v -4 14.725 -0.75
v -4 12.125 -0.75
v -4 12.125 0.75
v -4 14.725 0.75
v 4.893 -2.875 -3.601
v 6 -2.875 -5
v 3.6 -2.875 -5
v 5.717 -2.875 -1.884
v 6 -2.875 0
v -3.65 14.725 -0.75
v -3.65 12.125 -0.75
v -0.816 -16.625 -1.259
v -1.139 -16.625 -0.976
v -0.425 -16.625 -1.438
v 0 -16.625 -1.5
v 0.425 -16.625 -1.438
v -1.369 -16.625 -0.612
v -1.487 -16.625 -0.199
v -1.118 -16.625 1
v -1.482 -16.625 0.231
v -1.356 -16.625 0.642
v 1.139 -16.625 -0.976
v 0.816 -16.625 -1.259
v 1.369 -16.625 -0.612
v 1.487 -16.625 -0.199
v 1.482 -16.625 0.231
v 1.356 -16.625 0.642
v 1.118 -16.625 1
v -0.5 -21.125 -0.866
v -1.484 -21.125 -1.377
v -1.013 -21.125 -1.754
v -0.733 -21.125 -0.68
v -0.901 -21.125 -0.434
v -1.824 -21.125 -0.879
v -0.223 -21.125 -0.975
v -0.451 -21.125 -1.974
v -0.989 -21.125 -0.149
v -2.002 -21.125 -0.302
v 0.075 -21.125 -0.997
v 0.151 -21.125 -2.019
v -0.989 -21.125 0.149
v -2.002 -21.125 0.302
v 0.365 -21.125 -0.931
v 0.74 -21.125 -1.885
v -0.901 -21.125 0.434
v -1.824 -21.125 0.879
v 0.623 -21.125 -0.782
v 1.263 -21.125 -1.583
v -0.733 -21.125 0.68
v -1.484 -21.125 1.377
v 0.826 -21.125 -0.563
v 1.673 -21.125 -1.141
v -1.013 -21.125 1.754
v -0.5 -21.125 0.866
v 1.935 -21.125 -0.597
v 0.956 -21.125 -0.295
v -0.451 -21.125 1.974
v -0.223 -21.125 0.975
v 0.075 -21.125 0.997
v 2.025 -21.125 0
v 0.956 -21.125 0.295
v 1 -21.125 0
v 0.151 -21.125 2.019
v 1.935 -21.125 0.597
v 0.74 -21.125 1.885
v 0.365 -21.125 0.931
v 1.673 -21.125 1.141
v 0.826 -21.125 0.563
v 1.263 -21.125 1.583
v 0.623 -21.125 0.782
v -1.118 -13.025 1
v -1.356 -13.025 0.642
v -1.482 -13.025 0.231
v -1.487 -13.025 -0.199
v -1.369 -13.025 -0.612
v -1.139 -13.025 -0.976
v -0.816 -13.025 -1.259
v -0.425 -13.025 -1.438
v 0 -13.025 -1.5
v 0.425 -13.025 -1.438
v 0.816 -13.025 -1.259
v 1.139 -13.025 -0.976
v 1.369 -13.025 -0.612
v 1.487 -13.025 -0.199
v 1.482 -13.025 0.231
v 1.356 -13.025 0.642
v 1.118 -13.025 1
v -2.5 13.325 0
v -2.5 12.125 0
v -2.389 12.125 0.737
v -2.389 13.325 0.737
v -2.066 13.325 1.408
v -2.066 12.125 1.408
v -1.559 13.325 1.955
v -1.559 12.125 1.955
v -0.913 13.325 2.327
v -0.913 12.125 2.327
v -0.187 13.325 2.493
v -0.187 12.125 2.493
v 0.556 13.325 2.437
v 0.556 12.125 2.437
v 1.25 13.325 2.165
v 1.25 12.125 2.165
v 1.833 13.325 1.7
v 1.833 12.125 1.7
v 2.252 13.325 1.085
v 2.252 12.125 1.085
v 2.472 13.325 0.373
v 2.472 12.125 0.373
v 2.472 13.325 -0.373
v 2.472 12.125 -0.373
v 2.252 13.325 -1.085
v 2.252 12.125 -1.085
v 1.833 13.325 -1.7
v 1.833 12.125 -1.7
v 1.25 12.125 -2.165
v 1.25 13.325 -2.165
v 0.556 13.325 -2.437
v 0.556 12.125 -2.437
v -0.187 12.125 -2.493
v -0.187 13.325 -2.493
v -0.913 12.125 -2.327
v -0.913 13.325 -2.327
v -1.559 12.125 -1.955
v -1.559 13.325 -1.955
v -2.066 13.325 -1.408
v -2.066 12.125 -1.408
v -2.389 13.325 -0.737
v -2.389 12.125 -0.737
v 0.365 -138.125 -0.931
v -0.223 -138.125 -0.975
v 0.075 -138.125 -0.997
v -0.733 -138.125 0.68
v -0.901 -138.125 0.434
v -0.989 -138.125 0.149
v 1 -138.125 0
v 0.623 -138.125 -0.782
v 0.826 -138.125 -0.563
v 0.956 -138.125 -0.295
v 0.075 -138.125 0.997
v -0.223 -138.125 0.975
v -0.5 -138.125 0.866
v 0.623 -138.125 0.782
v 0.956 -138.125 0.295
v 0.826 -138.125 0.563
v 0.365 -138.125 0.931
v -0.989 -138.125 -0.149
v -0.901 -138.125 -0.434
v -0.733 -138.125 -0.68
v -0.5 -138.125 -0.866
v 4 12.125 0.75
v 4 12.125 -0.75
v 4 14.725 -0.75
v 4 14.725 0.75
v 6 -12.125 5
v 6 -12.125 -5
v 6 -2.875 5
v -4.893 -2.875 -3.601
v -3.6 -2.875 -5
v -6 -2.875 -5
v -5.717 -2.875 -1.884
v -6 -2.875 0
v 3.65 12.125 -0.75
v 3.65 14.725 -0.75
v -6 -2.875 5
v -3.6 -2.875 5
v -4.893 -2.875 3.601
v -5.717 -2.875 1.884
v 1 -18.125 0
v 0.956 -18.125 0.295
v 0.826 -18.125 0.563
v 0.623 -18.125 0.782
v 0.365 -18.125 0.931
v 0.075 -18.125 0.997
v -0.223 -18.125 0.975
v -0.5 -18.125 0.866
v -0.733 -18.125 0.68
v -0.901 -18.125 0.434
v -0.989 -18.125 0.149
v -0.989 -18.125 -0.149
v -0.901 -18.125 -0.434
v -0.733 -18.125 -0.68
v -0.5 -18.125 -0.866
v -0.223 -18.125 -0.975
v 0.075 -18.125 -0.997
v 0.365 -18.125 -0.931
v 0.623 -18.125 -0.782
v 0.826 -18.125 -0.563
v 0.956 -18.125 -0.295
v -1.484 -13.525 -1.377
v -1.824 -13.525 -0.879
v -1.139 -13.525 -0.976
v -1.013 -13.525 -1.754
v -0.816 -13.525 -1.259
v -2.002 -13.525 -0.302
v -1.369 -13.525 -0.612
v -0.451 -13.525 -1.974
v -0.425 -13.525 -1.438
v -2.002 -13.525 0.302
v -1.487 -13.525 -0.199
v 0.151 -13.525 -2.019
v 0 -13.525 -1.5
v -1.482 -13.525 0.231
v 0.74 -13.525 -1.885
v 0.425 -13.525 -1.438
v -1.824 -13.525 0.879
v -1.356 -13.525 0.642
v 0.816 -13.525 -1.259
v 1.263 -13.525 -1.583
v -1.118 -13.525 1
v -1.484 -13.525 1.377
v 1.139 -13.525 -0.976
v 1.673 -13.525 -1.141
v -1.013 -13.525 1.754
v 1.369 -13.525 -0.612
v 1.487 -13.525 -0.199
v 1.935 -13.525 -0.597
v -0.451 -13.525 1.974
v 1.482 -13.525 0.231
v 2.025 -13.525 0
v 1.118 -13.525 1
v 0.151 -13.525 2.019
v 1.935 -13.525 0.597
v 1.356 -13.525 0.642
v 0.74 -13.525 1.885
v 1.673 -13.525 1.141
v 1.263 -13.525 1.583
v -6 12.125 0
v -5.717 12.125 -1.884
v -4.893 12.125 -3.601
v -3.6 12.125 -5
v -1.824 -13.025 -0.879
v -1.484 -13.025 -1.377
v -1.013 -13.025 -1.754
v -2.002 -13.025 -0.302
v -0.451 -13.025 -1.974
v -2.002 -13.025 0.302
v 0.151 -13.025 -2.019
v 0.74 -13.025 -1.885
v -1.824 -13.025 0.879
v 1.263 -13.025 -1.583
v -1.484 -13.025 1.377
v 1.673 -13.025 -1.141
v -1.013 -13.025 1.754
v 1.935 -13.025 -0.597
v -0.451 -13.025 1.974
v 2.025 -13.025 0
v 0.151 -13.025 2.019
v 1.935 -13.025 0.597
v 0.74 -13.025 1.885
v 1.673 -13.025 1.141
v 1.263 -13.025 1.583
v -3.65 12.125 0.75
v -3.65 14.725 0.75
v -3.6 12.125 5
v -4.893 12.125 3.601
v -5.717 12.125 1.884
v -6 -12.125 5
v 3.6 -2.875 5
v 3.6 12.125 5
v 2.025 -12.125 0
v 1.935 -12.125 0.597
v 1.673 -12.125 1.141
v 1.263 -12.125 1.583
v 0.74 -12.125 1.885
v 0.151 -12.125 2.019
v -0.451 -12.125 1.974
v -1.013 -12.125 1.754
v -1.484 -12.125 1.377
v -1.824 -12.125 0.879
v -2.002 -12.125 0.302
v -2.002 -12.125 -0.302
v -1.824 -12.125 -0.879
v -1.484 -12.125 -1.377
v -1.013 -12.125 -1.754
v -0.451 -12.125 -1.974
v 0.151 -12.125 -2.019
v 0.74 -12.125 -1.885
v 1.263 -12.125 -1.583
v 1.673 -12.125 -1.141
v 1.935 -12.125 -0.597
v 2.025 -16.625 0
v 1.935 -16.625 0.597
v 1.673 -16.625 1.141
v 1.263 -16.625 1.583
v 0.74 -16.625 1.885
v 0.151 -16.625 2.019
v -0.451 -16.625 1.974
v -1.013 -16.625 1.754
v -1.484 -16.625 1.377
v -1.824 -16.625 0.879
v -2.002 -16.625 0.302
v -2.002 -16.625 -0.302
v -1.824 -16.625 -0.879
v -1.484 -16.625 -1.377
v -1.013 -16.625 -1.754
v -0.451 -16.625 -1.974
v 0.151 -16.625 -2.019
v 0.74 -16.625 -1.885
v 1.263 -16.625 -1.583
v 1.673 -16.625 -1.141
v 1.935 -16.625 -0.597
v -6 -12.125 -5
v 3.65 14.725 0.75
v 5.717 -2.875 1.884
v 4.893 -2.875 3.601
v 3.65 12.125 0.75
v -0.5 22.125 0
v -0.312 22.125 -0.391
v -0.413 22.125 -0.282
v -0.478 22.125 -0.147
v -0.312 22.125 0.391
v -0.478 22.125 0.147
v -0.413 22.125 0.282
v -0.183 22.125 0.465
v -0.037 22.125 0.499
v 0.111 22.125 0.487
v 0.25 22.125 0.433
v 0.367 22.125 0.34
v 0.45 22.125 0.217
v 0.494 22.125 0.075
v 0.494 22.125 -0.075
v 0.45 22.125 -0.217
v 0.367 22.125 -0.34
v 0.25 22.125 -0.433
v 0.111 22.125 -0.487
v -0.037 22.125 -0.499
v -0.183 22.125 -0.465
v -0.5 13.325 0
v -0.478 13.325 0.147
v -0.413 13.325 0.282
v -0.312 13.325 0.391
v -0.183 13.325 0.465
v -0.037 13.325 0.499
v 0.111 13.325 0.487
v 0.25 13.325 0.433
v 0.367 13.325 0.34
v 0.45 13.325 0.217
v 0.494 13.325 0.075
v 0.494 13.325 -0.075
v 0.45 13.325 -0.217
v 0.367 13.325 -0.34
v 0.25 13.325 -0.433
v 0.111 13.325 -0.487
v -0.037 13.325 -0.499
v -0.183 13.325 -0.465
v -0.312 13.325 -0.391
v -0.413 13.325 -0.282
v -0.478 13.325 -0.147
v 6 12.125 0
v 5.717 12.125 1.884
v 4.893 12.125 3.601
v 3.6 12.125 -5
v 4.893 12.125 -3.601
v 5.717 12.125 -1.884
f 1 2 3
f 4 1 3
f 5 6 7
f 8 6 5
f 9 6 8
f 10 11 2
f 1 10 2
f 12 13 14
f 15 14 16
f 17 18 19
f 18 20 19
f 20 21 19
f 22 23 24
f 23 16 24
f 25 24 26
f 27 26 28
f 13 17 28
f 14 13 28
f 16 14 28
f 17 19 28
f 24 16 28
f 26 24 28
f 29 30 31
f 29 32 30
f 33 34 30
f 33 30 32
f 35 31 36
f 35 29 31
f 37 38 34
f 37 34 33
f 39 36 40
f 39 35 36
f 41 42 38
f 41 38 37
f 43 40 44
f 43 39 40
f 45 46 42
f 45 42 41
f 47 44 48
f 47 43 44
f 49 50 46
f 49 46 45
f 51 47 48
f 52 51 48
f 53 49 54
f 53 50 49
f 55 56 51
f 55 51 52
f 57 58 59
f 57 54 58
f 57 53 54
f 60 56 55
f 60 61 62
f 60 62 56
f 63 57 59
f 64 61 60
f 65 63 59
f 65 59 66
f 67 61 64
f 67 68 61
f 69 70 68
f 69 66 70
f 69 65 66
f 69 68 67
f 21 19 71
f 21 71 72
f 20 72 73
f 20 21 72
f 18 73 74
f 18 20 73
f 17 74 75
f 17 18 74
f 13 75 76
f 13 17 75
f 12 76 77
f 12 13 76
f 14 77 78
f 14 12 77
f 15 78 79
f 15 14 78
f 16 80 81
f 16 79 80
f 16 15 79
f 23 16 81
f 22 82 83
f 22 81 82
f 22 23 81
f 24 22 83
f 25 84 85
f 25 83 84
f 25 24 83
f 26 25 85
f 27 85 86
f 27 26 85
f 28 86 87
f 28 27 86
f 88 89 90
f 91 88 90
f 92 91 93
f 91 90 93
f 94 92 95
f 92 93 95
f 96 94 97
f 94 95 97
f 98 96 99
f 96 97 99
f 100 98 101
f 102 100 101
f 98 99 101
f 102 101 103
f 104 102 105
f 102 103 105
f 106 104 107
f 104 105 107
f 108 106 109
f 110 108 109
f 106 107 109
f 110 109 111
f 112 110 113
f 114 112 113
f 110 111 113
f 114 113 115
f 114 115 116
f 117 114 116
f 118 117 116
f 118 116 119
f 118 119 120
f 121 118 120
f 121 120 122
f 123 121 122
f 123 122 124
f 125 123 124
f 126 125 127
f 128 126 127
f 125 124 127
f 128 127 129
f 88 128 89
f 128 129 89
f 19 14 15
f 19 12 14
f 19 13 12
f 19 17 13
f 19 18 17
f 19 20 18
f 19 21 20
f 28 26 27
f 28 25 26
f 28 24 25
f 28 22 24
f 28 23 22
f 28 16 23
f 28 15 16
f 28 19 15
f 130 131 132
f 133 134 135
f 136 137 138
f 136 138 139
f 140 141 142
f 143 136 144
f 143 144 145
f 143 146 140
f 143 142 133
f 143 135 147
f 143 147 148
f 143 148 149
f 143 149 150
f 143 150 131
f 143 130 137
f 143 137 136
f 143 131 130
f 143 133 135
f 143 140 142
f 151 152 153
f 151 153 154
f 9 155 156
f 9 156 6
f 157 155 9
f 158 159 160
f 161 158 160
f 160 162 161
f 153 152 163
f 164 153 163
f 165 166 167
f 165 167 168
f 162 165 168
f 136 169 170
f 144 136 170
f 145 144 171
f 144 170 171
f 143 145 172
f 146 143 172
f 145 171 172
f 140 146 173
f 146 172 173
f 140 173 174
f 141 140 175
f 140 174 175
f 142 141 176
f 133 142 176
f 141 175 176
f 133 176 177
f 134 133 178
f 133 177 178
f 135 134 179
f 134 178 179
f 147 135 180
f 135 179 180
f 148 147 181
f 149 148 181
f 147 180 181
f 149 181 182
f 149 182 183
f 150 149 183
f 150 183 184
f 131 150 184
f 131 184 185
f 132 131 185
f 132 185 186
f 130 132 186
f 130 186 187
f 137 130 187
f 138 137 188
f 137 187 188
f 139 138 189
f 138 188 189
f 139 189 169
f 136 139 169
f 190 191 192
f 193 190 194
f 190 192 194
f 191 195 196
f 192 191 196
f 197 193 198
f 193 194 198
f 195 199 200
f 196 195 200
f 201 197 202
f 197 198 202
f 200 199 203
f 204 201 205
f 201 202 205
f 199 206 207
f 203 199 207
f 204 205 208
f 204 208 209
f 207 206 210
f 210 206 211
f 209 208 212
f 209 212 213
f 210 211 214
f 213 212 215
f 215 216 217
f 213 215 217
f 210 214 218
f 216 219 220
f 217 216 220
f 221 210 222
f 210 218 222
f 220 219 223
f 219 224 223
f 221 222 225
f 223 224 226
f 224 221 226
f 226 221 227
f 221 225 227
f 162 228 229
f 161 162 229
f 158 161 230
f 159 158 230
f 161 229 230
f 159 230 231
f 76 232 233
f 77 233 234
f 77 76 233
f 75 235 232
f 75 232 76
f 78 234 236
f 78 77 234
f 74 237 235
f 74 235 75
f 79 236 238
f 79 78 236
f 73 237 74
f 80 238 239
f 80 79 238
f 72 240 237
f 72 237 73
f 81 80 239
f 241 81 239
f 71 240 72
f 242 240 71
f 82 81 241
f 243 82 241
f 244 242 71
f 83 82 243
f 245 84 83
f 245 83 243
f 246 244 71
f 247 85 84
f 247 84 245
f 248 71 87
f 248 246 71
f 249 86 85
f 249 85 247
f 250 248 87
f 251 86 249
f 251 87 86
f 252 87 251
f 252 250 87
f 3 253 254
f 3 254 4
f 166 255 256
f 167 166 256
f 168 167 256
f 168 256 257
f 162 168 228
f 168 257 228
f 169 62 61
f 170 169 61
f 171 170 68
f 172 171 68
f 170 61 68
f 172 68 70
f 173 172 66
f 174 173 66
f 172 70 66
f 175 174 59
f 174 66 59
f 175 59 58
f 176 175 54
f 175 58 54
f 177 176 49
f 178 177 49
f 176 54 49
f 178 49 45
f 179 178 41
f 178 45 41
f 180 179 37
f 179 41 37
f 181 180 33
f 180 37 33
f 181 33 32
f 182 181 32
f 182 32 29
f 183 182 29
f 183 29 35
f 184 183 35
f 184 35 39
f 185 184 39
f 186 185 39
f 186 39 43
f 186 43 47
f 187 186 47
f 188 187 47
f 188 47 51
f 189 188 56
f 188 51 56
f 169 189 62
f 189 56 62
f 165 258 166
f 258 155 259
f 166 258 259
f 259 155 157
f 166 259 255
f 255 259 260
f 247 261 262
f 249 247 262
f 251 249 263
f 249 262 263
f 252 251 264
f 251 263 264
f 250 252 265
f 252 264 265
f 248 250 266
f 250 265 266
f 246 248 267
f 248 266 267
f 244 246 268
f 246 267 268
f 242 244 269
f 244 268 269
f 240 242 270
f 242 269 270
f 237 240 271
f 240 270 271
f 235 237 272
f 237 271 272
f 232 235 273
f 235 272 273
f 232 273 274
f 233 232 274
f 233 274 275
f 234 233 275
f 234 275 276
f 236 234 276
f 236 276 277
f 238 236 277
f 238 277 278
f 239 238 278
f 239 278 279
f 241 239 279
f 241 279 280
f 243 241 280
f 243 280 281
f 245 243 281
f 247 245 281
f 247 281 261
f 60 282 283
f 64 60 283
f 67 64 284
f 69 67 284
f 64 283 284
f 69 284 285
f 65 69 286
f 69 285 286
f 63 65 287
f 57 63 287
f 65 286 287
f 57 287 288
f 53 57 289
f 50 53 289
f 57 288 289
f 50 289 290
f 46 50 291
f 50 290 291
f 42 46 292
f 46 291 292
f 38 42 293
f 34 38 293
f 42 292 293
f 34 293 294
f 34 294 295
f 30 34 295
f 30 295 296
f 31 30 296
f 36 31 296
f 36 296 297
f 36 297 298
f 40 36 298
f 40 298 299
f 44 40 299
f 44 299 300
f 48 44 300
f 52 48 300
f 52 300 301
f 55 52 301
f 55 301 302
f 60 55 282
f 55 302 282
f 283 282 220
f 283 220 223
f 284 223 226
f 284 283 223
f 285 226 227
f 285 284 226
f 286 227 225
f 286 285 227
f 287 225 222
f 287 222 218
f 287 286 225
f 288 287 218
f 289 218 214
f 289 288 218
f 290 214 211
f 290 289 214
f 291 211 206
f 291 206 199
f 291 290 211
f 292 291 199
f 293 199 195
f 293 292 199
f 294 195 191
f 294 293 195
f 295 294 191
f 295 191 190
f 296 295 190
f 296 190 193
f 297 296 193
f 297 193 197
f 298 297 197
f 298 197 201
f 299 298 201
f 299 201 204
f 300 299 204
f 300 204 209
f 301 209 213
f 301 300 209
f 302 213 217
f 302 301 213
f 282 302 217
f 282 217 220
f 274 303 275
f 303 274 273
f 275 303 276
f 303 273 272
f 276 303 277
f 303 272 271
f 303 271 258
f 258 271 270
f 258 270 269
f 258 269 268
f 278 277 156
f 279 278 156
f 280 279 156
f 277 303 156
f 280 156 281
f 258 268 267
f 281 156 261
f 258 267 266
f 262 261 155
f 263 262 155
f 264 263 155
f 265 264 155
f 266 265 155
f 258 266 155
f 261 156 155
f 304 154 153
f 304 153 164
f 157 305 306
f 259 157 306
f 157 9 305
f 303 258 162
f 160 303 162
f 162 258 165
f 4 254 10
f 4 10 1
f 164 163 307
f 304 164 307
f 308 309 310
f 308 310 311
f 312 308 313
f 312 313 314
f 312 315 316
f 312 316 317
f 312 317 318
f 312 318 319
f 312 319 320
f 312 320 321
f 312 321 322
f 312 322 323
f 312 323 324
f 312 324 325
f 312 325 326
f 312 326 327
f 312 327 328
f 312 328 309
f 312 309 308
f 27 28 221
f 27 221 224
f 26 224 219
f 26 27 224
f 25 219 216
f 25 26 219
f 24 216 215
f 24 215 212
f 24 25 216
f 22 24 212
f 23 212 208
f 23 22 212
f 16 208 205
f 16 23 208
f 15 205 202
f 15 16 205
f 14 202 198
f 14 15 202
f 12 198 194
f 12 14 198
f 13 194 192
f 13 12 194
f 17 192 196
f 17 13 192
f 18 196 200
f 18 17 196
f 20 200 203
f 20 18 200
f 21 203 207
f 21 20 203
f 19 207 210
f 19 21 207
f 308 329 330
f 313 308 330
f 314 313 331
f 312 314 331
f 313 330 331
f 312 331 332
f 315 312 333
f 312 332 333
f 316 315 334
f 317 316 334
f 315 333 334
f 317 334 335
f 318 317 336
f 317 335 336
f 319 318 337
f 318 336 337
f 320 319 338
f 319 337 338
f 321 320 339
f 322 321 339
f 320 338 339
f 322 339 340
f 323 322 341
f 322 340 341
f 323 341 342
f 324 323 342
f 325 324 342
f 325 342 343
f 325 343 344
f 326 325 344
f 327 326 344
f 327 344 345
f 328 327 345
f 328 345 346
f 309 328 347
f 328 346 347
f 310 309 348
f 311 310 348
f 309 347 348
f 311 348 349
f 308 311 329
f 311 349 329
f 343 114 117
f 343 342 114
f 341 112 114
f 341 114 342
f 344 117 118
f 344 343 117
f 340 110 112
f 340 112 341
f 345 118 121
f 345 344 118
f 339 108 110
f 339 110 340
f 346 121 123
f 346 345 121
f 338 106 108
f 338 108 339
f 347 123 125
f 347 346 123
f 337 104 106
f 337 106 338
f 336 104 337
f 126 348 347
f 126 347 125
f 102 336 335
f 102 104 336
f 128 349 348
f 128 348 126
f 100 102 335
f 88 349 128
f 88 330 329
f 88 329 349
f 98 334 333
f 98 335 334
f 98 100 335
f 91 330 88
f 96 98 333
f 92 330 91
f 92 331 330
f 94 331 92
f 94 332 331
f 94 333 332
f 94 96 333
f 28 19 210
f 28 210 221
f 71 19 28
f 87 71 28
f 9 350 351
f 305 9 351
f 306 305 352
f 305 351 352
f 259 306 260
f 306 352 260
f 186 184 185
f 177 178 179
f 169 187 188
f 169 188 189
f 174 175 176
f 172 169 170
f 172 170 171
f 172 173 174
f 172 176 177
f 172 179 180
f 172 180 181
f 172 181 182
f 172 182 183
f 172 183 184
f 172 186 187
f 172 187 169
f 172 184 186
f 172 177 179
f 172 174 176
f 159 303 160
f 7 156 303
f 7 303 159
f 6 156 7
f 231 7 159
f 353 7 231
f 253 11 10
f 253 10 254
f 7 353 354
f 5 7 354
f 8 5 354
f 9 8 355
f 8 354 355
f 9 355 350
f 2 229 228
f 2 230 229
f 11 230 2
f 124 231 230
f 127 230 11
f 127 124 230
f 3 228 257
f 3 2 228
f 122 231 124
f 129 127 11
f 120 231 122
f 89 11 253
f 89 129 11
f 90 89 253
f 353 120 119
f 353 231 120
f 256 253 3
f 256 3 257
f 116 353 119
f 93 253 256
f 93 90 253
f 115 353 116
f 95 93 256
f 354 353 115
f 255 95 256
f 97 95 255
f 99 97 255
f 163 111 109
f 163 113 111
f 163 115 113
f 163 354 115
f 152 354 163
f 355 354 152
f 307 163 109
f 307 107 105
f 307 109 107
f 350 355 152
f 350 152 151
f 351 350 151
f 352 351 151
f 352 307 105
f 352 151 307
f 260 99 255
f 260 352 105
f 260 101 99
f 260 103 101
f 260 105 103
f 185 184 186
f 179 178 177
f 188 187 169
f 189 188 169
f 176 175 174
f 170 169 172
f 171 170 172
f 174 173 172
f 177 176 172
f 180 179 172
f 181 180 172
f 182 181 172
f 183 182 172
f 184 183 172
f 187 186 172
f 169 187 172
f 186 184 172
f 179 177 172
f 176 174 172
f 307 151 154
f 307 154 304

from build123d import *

# Parameters (mm, degrees)
F0_W      = 24.25
F0_H      = 10
F1_DEPTH  = 6
F3_DEPTH  = 15
F4_R      = 2.025
F5_DEPTH  = 4.5
F6_R      = 2.025
F6_R_2    = 1.5
F7_DEPTH  = 3.6
F9_DEPTH  = 3.6
F10_R     = 2.5
F11_DEPTH = 1.2
F12_W     = 0.35
F12_H     = 1.5
F13_DEPTH = 2.6
F14_R     = 0.5
F15_DEPTH = 8.8
F16_R     = 2.025
F17_DEPTH = 3.1
F18_R     = 2.025
F19_DEPTH = 4.5
F20_R     = 1
F21_DEPTH = 3
F22_DEPTH = 120


with BuildPart() as f1:
    # F0 (on Right) → F1 (new body, symmetric)
    with BuildSketch(Plane.YZ):
        Rectangle(F0_W, F0_H)
    extrude(amount=F1_DEPTH, both=True)

    # F2 (on face) → F3 (cut)
    with BuildSketch(Plane(origin=(0, 12.125, 0), x_dir=(-1, 0, 0), z_dir=(0, 1, 0))):
        with BuildLine():
            ThreePointArc((-3.6, -5), (-5.3689269262, -2.7730849257), (-6, -2.1e-09))
            Line((-6, -2.1e-09), (-6, -5))
            Line((-6, -5), (-3.6, -5))
        make_face()
        with BuildLine():
            ThreePointArc((-6, -2.1e-09), (-5.3689269271, 2.7730849238), (-3.6, 5))
            Line((-3.6, 5), (-6, 5))
            Line((-6, 5), (-6, -2.1e-09))
        make_face()
        with BuildLine():
            ThreePointArc((3.6, 5), (5.3689269271, 2.7730849238), (6, -2.1e-09))
            Line((6, -2.1e-09), (6, 5))
            Line((6, 5), (3.6, 5))
        make_face()
        with BuildLine():
            Line((3.6, -5), (6, -5))
            Line((6, -5), (6, -2.1e-09))
            ThreePointArc((6, -2.1e-09), (5.3689269262, -2.7730849257), (3.6, -5))
        make_face()
    extrude(amount=-F3_DEPTH, mode=Mode.SUBTRACT)

    # F4 (on face) → F5 (join)
    with BuildSketch(Plane.XZ.offset(12.125)):
        Circle(F4_R)
    extrude(amount=F5_DEPTH)

    # F6 (on face) → F7 (cut)
    with BuildSketch(Plane.XZ.offset(16.625)):
        Circle(F6_R)
        Circle(F6_R_2, mode=Mode.SUBTRACT)
    extrude(amount=-F7_DEPTH, mode=Mode.SUBTRACT)

    # F8 (on face) → F9 (cut, through all)
    with BuildSketch(Plane.XZ.offset(16.625)):
        with BuildLine():
            ThreePointArc((1.1180339887, 1), (0, 1.5), (-1.1180339887, 1))
            Line((-1.1180339887, 1), (1.1180339887, 1))
        make_face()
    extrude(amount=-F9_DEPTH, mode=Mode.SUBTRACT)

    # F10 (on face) → F11 (join)
    with BuildSketch(Plane(origin=(0, 12.125, 0), x_dir=(-1, 0, 0), z_dir=(0, 1, 0))):
        Circle(F10_R)
    extrude(amount=F11_DEPTH)

    # F12 (on face) → F13 (join)
    with BuildSketch(Plane(origin=(0, 12.125, 0), x_dir=(-1, 0, 0), z_dir=(0, 1, 0))):
        with Locations((-3.825, 0)):
            Rectangle(F12_W, F12_H)
        with Locations((3.825, 0)):
            Rectangle(F12_W, F12_H)
    extrude(amount=F13_DEPTH)

    # F14 (on face) → F15 (join)
    with BuildSketch(Plane(origin=(0, 13.325, 0), x_dir=(-1, 0, 0), z_dir=(0, 1, 0))):
        Circle(F14_R)
    extrude(amount=F15_DEPTH)


with BuildPart() as f17:
    # F16 (on face) → F17 (new body)
    with BuildSketch(Plane.XZ.offset(16.625)):
        Circle(F16_R)
        with BuildLine():
            ThreePointArc((1.1180339887, 1), (0, -1.5), (-1.1180339887, 1))
            Line((-1.1180339887, 1), (1.1180339887, 1))
        make_face(mode=Mode.SUBTRACT)
    extrude(amount=-F17_DEPTH)

    # F18 (on face) → F19 (join)
    with BuildSketch(Plane.XZ.offset(16.625)):
        Circle(F18_R)
    extrude(amount=F19_DEPTH)

    # F20 (on face) → F21 (cut)
    with BuildSketch(Plane.XZ.offset(21.125)):
        Circle(F20_R)
    extrude(amount=-F21_DEPTH, mode=Mode.SUBTRACT)


with BuildPart() as f22:
    # F22 (new): a face of the model
    f22_faces = [f17.part.faces().sort_by_distance(p)[0] for p in [
        (0, -18.125, 0),
    ]]
    extrude(f22_faces, amount=F22_DEPTH)


solid = Compound([f1.part, f17.part, f22.part])
